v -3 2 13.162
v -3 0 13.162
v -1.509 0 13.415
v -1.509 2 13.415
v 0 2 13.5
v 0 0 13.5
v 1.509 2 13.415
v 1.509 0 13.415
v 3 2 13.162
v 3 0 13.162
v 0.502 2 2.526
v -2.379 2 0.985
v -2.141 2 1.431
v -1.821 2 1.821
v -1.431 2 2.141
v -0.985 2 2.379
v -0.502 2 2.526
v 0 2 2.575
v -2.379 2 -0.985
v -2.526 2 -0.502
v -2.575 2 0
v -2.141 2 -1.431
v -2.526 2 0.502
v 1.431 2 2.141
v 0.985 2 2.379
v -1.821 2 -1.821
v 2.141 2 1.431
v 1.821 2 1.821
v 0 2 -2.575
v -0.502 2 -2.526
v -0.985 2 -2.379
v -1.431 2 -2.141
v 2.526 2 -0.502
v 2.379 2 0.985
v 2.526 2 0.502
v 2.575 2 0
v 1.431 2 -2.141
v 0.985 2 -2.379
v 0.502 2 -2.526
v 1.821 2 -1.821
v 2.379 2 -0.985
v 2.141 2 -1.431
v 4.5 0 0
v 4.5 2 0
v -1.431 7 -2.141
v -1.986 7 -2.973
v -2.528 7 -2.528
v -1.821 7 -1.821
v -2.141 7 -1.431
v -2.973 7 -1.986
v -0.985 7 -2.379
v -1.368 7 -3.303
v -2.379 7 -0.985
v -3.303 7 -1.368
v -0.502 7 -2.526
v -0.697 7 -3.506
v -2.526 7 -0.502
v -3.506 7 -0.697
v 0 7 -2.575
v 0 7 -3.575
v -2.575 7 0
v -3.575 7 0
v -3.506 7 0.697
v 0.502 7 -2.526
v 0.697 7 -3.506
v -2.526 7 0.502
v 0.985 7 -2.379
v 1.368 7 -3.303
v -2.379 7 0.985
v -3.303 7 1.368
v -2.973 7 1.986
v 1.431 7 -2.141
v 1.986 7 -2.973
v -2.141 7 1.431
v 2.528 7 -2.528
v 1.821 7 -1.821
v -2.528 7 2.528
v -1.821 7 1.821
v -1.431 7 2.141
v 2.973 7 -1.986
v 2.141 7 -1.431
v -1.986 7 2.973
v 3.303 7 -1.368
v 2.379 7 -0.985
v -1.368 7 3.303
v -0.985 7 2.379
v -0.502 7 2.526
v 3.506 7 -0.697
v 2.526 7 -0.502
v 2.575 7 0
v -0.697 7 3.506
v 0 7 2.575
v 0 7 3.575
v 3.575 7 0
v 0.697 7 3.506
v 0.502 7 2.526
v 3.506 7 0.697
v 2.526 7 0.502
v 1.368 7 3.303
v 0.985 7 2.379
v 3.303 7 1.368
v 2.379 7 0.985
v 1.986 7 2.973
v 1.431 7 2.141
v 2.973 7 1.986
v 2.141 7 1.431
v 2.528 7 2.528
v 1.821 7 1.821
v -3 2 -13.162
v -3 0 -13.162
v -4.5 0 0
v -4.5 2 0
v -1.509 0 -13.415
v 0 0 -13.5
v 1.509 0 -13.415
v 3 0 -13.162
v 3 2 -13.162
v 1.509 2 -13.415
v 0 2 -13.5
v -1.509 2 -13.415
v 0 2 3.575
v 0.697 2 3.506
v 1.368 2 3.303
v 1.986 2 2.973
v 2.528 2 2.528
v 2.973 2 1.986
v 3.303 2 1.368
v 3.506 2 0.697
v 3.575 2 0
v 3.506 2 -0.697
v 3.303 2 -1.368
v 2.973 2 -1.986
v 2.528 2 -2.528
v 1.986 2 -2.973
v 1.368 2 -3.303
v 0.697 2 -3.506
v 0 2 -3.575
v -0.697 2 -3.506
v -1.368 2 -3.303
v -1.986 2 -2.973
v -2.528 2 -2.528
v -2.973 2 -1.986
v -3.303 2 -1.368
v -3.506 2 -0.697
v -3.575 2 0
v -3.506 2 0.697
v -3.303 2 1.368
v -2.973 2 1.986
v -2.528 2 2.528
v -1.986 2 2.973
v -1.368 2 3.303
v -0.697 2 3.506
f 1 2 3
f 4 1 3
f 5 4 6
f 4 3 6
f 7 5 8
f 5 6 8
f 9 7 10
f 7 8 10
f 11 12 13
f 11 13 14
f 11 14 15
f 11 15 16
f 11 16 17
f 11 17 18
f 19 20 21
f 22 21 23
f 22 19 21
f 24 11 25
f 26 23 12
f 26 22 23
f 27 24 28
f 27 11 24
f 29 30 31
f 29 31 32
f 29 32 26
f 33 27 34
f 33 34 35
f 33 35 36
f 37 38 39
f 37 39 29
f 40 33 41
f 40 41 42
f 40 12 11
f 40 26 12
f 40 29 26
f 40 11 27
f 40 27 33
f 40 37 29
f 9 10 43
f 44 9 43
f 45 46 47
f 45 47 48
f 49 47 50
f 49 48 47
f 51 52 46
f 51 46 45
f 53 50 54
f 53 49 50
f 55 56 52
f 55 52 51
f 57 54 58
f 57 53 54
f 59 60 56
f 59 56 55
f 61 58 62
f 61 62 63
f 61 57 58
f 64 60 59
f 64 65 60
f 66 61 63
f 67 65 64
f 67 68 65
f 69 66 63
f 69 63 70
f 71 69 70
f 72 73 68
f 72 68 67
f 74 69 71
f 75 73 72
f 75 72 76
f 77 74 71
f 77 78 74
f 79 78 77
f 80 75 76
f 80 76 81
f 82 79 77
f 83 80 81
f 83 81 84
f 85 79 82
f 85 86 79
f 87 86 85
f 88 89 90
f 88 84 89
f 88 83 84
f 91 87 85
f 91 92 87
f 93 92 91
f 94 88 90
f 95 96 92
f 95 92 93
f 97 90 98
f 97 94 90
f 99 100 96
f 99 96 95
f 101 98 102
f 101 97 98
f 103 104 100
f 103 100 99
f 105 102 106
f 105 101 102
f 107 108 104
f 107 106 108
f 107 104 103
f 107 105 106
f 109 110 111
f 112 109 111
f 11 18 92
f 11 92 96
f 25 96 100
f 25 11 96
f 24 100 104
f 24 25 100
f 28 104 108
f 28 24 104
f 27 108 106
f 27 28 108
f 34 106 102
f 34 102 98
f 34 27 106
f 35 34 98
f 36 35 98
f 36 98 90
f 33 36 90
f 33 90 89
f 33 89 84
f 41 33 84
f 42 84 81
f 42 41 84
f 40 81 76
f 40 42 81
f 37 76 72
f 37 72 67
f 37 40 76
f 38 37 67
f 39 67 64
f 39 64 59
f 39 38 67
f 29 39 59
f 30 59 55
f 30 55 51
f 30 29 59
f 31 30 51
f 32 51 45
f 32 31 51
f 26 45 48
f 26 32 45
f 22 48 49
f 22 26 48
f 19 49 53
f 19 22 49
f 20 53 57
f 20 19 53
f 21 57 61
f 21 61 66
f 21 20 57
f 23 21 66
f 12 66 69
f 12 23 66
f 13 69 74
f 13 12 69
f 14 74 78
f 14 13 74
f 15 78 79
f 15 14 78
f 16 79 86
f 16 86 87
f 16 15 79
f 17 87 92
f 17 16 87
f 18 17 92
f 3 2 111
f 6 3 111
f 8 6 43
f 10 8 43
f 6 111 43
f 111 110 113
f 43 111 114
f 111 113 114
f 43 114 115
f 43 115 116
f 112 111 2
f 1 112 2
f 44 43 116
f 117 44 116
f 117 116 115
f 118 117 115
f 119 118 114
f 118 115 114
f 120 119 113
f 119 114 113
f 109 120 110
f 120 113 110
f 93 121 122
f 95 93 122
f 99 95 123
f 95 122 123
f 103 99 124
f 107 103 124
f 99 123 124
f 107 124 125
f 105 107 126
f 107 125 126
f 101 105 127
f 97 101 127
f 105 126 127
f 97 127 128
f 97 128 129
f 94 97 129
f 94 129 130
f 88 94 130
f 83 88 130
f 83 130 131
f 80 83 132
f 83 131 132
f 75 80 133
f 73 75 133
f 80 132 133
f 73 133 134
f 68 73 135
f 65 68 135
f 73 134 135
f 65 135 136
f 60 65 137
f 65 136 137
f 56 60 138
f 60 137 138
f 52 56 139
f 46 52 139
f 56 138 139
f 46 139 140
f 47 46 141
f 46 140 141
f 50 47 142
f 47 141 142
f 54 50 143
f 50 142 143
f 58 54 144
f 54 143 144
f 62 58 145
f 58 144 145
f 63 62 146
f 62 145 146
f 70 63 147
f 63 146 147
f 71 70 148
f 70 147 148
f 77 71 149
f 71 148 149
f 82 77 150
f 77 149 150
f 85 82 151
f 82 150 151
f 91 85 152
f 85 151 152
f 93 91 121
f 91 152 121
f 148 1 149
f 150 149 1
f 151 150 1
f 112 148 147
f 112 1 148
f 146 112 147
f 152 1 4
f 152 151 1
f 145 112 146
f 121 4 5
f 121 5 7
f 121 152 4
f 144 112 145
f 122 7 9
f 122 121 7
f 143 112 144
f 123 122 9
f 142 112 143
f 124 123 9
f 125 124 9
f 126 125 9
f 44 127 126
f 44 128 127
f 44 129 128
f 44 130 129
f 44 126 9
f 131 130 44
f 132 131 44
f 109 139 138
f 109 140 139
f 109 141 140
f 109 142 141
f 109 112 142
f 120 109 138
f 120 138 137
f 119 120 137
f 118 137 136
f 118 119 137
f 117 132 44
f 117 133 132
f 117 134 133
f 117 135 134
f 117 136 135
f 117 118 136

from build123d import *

# Parameters (mm, degrees)
SALIENTE_EXTRUIR1_DEPTH = 2
CROQUIS3_R              = 3.575
CROQUIS3_R_2            = 2.575
SALIENTE_EXTRUIR2_DEPTH = 5


with BuildPart() as part:
    # Croquis1 → Saliente-Extruir1 (new body)
    with BuildSketch(Plane(origin=(0, 0, 0), x_dir=(1, 0, 0), z_dir=(0, 1, 0))):
        with BuildLine():
            Line((-3, 13.162446581), (-4.5, 0))
            Line((-4.5, 0), (-3, -13.162446581))
            ThreePointArc((-3, -13.162446581), (0, -13.5), (3, -13.162446581))
            Line((3, -13.162446581), (4.5, 0))
            Line((4.5, 0), (3, 13.162446581))
            ThreePointArc((3, 13.162446581), (0, 13.5), (-3, 13.162446581))
        make_face()
    extrude(amount=SALIENTE_EXTRUIR1_DEPTH)

    # Croquis3 → Saliente-Extruir2 (add)
    with BuildSketch(Plane(origin=(0, 2, 0), x_dir=(1, 0, 0), z_dir=(0, 1, 0))):
        with Locations(Location((0, 0, 0), (0, 0, 270))):
            Circle(CROQUIS3_R)
        with Locations(Location((0, 0, 0), (0, 0, 270))):
            Circle(CROQUIS3_R_2, mode=Mode.SUBTRACT)
    extrude(amount=SALIENTE_EXTRUIR2_DEPTH)


solid = part.part
